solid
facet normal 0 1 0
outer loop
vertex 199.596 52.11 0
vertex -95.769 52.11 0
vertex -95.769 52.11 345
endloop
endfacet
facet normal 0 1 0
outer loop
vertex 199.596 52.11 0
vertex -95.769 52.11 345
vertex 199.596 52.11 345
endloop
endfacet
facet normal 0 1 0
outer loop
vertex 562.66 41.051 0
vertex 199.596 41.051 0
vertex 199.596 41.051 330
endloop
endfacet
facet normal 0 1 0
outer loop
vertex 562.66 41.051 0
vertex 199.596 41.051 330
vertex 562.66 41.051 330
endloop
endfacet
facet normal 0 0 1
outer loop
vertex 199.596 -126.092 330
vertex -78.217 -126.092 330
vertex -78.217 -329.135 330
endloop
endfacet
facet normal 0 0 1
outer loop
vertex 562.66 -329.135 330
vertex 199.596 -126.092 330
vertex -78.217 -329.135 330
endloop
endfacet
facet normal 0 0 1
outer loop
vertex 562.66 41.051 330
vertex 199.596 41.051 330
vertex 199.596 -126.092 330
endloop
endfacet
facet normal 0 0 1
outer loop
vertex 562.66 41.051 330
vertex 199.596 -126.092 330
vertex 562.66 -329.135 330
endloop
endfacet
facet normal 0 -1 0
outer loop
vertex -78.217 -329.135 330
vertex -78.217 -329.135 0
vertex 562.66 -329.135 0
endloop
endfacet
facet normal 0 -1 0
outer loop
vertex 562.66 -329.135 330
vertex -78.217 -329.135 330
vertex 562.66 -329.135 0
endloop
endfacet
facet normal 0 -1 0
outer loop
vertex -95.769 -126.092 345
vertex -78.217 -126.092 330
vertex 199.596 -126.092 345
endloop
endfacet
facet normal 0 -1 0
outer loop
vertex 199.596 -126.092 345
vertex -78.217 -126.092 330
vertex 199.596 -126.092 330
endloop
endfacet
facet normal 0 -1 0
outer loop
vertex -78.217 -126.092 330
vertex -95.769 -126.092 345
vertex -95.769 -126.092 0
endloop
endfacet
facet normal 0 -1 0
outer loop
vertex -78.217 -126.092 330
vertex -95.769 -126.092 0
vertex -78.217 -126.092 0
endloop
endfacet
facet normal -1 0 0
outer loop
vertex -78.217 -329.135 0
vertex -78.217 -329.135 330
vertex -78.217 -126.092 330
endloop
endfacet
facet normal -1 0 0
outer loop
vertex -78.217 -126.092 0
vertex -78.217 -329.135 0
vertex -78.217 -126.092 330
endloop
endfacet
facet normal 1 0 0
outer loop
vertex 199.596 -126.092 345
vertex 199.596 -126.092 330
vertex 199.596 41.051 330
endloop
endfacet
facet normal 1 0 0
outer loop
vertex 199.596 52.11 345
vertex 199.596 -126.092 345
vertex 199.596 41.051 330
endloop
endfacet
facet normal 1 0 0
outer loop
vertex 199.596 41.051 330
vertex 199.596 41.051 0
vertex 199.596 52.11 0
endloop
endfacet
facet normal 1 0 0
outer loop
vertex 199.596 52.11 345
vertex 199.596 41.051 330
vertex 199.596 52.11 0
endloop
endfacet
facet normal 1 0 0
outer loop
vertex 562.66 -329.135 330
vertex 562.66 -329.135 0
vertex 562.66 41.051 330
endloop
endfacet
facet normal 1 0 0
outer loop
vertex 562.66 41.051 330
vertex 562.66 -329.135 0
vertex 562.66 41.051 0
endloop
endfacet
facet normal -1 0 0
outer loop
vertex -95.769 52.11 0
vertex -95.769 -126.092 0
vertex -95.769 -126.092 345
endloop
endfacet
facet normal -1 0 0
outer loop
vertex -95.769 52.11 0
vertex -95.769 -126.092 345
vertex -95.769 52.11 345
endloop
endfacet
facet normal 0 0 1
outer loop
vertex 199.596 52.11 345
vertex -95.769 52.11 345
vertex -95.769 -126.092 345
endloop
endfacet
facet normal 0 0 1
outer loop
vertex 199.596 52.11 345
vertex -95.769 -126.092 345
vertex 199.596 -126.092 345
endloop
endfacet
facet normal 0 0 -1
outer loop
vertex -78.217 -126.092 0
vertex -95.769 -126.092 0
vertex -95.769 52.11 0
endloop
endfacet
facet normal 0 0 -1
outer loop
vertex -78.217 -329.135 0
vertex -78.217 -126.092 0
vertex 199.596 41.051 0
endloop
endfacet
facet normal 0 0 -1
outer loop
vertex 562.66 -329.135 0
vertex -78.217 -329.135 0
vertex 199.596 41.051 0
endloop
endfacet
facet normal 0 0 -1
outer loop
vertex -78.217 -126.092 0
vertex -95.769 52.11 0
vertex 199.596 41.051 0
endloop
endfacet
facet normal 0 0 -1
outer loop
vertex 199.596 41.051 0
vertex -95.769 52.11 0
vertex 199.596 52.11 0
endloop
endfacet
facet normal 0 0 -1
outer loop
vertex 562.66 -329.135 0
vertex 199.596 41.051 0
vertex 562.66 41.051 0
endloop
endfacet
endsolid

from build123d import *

# Parameters (mm, degrees)
F1_W     = 640.876718
F1_H     = 370.186116
F2_DEPTH = 330
F0_W     = 295.364954
F0_H     = 178.202663
F3_DEPTH = 345


with BuildPart() as f2:
    # F1 (on Top) → F2 (new body)
    with BuildSketch(Plane.XY):
        with Locations((242.221858, -144.041853)):
            Rectangle(F1_W, F1_H)
    extrude(amount=F2_DEPTH)

    # F0 (on Top) → F3 (join)
    with BuildSketch(Plane.XY):
        with Locations((51.913496, -36.990968)):
            Rectangle(F0_W, F0_H)
    extrude(amount=F3_DEPTH)


solid = f2.part
